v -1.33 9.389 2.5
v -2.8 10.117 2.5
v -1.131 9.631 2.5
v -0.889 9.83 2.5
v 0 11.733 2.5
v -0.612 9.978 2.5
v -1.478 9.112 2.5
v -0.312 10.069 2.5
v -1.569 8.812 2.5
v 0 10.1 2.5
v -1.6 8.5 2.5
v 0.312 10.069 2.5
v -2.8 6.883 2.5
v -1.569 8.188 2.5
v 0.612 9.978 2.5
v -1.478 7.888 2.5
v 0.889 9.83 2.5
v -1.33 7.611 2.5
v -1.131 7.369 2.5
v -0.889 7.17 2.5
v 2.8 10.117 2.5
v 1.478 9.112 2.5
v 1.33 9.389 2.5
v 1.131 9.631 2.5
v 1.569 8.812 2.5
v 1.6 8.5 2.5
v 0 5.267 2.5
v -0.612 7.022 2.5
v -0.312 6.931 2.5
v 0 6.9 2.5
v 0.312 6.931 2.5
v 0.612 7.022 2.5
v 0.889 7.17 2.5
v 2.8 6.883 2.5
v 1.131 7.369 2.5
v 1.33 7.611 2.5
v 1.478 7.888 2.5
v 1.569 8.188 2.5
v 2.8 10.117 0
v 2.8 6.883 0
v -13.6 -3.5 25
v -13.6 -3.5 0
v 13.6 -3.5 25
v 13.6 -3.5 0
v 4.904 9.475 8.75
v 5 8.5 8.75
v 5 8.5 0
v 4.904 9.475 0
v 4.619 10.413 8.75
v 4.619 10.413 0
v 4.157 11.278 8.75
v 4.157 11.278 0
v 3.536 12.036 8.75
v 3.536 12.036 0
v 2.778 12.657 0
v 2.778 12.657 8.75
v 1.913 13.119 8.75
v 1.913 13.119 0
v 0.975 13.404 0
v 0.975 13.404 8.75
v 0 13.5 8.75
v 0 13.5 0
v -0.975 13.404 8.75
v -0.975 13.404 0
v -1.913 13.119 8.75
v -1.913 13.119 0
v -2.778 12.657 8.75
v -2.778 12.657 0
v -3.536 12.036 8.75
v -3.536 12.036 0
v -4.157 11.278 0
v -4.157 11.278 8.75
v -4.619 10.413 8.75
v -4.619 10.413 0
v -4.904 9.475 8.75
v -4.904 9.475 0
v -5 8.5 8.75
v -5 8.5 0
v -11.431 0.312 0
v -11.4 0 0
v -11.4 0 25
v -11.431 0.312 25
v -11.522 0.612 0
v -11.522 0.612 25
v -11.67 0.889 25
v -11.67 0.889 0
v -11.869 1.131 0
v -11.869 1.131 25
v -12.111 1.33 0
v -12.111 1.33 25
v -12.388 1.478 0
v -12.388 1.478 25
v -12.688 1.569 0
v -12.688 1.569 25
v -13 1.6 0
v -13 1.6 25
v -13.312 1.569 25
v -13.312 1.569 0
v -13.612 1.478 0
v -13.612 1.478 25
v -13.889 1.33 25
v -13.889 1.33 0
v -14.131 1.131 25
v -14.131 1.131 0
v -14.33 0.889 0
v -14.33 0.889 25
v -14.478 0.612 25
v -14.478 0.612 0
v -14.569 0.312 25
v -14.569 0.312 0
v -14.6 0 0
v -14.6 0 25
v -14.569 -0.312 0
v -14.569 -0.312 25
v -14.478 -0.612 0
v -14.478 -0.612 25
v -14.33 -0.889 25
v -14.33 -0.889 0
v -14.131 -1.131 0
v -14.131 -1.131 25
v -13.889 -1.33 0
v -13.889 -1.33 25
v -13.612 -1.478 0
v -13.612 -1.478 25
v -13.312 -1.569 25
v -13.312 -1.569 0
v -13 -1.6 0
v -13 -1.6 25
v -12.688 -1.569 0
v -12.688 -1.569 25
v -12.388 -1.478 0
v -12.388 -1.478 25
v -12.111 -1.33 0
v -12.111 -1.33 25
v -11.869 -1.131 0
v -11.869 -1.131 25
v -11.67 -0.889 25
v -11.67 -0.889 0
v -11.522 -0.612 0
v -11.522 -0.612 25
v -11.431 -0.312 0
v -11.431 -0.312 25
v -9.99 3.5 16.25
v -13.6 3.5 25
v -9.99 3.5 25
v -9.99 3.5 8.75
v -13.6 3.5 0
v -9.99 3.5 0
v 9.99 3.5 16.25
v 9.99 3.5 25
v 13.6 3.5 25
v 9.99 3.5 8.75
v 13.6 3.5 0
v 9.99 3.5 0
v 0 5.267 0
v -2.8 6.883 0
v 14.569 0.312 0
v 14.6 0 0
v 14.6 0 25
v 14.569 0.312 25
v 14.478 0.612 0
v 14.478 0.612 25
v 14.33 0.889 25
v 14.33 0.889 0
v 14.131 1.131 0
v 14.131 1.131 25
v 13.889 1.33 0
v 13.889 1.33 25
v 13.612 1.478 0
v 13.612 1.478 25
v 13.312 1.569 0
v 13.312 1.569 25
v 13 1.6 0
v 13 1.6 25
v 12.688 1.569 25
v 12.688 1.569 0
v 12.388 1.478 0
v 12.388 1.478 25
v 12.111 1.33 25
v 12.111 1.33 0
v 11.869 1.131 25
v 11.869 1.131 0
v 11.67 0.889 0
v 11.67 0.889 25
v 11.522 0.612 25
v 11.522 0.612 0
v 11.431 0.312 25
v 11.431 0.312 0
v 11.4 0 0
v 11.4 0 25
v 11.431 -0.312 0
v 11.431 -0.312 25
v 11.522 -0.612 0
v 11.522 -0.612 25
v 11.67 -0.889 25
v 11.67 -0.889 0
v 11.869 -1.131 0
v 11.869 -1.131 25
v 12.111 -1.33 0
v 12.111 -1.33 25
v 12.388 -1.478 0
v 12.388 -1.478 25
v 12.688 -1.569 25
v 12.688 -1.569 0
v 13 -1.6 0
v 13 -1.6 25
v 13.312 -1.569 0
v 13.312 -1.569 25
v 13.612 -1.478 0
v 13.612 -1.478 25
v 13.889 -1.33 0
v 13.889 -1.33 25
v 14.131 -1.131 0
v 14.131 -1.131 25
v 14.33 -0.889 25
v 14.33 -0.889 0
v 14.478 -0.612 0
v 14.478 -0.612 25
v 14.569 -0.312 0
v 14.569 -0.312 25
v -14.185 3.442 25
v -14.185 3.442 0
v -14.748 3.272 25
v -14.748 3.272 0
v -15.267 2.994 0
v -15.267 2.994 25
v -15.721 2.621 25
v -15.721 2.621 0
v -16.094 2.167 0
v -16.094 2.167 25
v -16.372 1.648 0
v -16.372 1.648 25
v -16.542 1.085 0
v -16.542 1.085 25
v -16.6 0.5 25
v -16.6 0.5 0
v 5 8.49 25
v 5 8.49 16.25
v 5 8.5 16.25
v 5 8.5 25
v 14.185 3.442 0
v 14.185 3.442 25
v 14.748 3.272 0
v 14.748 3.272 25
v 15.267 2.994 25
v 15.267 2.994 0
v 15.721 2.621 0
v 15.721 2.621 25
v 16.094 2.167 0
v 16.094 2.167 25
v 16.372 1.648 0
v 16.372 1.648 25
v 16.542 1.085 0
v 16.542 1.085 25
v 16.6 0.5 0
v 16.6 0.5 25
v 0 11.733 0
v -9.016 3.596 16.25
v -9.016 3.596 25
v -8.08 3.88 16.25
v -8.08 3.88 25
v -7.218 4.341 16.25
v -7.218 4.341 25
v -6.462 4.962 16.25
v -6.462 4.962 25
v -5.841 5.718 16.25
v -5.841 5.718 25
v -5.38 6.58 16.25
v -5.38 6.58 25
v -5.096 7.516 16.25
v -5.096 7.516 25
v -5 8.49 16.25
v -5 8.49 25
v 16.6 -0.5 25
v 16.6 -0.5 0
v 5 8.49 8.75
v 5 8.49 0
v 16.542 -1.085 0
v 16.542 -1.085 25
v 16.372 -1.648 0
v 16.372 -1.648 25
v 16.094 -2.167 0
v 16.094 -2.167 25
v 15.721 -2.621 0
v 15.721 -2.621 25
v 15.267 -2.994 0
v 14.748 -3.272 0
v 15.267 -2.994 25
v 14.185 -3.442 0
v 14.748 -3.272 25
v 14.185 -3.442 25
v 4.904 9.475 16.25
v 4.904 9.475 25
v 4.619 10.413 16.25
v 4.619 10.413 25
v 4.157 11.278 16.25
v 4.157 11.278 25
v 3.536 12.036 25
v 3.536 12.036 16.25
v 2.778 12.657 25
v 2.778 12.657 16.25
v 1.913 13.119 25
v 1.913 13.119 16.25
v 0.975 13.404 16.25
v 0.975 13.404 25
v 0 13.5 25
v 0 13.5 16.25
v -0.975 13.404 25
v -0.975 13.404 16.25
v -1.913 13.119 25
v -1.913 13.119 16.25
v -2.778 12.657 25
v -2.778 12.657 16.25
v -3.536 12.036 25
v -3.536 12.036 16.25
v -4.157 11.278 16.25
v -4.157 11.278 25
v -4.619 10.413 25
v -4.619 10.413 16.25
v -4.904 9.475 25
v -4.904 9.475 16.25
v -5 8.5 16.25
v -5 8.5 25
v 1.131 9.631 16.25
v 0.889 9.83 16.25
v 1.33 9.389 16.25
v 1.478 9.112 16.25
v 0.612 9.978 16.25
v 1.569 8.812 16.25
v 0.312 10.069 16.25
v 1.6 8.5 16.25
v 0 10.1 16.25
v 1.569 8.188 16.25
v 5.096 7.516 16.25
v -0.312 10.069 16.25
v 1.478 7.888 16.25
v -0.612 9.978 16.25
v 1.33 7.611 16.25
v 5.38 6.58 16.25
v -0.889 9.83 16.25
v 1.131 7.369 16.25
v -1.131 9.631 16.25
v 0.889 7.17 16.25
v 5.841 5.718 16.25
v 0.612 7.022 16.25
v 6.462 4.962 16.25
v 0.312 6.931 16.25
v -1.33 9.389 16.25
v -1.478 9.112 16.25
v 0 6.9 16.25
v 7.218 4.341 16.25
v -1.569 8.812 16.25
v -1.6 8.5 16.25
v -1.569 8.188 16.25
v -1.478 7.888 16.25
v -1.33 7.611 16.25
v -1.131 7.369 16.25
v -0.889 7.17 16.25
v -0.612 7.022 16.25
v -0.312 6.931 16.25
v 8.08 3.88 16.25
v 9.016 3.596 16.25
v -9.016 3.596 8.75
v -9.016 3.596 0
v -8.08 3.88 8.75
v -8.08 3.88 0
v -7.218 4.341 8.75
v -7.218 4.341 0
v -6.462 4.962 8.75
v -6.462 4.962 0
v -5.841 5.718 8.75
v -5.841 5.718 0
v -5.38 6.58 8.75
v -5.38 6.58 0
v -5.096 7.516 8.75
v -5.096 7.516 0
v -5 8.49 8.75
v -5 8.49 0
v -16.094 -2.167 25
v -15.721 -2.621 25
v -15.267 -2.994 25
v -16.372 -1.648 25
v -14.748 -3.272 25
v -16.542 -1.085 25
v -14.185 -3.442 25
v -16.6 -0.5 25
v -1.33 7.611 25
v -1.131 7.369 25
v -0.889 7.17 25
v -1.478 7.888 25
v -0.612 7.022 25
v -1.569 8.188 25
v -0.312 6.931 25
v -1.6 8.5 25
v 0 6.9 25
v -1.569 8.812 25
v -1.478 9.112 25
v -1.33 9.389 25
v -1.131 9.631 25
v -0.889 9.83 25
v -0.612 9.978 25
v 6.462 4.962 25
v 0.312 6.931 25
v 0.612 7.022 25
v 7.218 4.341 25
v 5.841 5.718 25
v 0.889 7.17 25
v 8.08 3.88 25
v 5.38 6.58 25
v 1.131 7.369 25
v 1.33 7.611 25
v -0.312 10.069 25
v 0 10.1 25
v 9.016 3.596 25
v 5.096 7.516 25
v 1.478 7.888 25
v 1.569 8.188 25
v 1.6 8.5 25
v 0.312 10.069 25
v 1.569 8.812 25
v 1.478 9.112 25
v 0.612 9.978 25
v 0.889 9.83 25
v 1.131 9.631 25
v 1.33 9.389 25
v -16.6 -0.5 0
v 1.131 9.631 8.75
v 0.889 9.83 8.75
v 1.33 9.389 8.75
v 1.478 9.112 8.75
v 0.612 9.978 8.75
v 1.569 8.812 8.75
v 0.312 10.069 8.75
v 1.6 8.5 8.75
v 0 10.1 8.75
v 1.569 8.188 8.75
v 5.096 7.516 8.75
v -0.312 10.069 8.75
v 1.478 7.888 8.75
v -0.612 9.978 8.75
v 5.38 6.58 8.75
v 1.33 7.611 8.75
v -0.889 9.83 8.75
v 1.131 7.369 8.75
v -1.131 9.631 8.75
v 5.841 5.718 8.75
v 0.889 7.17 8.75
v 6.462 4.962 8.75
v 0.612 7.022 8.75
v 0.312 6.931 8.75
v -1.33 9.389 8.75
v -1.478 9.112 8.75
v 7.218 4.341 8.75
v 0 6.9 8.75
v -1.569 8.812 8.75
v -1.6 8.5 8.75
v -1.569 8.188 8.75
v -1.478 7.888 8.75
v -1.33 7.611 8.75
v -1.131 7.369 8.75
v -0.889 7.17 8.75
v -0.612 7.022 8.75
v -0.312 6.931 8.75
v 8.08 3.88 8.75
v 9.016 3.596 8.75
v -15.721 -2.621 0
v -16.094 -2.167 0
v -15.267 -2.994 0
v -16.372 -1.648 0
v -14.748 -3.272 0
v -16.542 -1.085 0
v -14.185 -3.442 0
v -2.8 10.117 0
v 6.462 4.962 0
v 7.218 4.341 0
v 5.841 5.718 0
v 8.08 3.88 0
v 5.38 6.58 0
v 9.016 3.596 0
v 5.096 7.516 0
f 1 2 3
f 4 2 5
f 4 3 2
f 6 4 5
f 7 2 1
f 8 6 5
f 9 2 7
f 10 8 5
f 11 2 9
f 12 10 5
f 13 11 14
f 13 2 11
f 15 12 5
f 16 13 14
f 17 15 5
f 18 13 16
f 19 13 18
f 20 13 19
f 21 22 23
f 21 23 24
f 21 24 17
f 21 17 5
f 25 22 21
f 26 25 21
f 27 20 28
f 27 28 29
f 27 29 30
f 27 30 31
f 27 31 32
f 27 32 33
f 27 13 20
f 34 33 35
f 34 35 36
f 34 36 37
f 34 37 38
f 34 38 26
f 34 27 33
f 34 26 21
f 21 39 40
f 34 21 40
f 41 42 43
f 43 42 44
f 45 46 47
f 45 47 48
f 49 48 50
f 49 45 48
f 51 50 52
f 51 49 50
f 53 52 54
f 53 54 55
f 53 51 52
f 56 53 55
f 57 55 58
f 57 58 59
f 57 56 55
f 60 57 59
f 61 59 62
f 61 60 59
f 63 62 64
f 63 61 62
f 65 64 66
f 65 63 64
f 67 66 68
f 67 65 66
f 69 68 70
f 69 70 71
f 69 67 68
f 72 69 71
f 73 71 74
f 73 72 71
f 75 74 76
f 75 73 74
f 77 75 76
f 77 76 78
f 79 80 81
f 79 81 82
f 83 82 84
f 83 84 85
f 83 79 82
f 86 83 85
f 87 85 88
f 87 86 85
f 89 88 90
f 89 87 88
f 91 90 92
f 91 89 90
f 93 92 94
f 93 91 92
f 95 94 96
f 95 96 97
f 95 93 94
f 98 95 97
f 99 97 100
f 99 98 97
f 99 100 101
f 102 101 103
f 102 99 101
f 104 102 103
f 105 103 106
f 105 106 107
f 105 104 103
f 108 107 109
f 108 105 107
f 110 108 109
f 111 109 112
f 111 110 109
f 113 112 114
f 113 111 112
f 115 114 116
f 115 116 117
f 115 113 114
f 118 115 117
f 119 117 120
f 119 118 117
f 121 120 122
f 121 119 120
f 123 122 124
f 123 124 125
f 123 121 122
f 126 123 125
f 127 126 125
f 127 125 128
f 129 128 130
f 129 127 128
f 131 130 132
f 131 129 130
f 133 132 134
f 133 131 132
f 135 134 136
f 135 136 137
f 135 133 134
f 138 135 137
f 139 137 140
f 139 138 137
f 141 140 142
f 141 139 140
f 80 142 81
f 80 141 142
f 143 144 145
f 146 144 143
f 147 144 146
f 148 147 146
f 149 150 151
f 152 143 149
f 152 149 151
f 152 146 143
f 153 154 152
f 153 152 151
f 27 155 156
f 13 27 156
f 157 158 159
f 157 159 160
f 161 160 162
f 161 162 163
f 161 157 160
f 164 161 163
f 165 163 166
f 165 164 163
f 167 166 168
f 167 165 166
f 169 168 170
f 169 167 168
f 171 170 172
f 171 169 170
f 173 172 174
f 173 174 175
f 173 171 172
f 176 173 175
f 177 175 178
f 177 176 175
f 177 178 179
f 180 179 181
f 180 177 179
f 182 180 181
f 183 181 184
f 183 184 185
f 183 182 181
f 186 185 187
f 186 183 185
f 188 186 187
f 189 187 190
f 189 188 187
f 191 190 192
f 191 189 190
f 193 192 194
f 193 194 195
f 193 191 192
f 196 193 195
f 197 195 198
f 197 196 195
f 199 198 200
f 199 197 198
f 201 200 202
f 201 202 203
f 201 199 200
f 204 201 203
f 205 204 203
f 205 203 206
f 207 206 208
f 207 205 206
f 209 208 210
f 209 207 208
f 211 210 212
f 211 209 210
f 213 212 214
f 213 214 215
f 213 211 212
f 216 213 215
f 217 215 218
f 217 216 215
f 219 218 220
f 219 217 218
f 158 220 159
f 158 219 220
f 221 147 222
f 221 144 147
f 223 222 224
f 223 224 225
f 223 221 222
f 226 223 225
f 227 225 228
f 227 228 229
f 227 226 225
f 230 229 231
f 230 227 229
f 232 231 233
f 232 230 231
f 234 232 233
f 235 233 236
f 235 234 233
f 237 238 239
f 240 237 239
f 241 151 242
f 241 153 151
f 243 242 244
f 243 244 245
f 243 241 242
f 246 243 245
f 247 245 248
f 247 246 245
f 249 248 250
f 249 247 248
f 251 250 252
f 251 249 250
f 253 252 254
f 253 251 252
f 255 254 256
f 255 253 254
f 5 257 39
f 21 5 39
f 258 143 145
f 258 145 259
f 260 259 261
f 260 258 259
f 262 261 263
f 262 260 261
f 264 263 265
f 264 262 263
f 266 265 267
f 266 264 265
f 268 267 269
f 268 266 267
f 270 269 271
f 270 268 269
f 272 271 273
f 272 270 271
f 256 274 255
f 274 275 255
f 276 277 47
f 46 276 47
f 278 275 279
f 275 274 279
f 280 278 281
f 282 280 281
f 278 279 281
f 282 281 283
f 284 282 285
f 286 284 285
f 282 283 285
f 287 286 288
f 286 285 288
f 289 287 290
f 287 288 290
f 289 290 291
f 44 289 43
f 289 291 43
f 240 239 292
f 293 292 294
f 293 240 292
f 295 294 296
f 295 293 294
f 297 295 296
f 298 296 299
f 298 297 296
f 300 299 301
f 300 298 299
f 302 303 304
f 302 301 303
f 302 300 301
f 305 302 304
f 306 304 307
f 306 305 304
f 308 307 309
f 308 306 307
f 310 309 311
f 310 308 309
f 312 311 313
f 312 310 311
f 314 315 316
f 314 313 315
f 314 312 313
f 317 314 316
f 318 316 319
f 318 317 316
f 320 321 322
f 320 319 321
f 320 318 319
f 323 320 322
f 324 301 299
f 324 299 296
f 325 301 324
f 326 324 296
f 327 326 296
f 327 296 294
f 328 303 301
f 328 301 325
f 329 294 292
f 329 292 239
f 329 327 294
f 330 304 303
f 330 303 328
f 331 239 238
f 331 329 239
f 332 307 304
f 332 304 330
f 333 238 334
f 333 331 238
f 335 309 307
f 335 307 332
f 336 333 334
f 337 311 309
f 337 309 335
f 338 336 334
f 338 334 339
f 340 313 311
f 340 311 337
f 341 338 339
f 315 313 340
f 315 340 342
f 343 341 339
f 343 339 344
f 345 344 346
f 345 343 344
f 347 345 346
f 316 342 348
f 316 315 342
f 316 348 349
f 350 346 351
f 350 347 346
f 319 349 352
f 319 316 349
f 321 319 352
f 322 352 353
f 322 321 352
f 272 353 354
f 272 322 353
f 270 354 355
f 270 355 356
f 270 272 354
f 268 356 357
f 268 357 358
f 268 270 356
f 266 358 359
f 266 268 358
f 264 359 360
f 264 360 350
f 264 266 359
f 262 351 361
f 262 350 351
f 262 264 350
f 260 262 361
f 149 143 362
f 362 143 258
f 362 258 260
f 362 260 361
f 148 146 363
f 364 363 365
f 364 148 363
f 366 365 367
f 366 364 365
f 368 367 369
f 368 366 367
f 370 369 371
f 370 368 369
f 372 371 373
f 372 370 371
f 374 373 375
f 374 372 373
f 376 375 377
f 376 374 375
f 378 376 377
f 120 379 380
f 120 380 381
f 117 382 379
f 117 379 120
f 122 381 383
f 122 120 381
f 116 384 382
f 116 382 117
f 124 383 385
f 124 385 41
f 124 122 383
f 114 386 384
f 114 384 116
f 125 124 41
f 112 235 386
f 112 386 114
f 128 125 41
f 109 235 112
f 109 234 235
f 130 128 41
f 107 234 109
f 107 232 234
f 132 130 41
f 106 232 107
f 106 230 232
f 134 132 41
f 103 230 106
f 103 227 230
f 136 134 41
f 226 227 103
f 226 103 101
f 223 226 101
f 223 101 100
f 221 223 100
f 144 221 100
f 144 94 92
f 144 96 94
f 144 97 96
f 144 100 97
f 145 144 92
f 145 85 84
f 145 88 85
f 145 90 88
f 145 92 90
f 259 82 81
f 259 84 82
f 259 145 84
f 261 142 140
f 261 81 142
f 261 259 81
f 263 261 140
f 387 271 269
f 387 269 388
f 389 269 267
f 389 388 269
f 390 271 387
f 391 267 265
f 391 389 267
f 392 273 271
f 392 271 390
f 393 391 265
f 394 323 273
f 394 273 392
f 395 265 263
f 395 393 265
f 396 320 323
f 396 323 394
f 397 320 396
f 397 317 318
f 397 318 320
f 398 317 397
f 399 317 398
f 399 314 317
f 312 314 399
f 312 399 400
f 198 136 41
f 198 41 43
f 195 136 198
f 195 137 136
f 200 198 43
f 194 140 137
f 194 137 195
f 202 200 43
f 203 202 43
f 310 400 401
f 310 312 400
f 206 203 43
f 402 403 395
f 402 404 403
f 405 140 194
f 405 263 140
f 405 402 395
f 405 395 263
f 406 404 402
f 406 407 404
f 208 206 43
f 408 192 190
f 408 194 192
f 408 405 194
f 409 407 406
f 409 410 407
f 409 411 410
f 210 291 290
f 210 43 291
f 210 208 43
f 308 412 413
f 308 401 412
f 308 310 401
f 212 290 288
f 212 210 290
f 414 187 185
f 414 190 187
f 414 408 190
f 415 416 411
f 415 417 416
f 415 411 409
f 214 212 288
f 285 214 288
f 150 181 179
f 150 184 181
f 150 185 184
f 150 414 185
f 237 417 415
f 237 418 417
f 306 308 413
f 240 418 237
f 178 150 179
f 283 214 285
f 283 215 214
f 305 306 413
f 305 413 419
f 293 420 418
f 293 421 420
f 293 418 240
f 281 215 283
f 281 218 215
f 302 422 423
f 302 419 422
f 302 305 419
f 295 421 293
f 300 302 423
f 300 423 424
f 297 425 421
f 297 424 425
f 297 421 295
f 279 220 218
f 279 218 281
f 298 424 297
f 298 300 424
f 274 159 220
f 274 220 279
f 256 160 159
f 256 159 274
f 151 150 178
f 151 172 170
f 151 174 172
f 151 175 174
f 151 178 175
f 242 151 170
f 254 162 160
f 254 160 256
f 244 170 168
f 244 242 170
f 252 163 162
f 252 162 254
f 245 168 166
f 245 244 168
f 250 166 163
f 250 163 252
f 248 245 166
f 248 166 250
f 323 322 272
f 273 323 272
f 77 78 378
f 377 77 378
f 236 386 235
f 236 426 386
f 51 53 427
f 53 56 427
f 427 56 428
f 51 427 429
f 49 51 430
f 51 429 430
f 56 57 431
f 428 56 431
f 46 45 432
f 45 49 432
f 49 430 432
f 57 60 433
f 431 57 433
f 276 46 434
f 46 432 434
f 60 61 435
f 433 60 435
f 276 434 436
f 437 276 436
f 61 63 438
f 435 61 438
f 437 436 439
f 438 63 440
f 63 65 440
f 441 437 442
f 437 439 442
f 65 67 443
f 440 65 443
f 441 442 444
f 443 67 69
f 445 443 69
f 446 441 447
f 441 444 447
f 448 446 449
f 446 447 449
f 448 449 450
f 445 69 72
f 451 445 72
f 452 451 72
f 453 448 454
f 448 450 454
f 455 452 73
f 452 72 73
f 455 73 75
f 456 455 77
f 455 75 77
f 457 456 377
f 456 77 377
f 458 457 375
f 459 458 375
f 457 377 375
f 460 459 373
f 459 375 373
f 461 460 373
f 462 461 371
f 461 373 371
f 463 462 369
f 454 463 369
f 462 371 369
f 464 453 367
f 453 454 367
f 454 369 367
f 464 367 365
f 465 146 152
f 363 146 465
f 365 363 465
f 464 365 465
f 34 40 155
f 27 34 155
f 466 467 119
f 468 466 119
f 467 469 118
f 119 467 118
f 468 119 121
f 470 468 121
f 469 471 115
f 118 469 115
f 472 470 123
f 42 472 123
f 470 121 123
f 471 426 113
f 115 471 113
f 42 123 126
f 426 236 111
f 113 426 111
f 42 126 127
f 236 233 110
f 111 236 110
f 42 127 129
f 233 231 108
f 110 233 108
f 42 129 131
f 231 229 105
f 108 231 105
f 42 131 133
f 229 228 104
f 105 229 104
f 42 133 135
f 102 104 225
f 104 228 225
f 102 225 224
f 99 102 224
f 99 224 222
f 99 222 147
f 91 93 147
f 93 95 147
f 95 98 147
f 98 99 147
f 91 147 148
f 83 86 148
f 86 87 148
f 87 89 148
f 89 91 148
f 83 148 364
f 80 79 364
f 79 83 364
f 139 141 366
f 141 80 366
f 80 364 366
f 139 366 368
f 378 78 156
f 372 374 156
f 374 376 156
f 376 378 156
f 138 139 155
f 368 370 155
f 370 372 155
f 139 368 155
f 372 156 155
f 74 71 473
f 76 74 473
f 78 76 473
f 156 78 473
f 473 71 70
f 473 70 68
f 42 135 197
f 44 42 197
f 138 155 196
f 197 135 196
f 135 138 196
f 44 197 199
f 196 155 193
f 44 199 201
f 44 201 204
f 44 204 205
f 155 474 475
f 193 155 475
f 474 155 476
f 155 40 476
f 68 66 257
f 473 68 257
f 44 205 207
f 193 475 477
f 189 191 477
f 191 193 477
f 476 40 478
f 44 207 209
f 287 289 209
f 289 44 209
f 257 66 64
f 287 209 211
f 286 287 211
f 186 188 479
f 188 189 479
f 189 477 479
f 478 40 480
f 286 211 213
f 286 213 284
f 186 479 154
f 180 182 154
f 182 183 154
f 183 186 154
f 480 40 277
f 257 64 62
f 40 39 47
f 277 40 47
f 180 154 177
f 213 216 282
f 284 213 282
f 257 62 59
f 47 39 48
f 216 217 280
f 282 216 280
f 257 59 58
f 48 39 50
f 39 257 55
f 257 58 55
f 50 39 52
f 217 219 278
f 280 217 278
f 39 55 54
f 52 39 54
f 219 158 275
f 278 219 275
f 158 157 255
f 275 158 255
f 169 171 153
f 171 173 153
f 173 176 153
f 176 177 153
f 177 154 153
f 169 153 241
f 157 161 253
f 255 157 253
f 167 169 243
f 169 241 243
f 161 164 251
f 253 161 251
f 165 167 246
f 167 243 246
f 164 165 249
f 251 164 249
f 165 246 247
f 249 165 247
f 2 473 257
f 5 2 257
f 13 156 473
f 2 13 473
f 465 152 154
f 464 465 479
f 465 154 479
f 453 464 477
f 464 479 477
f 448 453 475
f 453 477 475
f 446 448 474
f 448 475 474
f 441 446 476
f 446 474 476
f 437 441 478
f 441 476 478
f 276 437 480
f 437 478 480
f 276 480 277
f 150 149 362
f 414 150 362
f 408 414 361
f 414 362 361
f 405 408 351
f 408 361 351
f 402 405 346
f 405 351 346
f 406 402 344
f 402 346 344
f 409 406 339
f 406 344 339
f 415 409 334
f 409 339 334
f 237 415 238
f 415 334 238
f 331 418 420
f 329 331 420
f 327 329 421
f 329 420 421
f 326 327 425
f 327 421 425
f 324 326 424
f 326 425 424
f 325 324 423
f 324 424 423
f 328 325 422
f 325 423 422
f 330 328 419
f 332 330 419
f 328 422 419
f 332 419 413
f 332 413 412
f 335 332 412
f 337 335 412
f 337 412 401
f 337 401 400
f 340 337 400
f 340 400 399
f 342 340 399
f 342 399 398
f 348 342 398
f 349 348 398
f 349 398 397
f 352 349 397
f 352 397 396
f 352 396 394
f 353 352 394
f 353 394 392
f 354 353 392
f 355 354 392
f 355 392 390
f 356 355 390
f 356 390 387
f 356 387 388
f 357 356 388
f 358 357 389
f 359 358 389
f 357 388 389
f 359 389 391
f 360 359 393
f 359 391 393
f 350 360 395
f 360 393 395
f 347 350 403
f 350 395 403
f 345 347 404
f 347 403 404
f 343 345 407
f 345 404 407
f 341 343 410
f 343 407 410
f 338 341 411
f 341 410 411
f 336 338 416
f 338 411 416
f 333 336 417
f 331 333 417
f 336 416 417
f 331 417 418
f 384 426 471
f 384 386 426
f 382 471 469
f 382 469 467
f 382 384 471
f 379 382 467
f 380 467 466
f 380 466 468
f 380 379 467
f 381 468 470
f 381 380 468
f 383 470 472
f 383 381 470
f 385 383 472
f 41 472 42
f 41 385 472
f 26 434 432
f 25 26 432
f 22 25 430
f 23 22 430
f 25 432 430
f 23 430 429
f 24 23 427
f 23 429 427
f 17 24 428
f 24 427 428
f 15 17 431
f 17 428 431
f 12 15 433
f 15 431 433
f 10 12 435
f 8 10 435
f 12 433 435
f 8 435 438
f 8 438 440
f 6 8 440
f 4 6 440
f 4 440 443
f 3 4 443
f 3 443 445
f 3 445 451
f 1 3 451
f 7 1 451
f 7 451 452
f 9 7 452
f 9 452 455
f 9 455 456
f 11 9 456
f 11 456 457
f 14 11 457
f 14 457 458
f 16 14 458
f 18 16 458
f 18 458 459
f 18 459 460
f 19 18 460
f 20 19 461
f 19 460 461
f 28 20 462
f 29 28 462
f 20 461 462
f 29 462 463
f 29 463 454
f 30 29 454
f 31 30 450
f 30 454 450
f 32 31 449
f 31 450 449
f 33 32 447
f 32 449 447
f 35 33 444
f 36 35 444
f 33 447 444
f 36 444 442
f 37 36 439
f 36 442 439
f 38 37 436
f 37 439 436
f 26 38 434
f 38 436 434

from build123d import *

# Parameters (mm, degrees)
SKETCH_W        = 33.2
SKETCH_H        = 7
SKETCH_R        = 1.6
PAD_DEPTH       = 25
SKETCH001_R     = 1.6
PAD001_DEPTH    = 25
FILLET_R        = 4.99
SKETCH002_W     = 10
SKETCH002_H     = 7.5
POCKET_DEPTH    = 33.201
POCKET001_DEPTH = 2.5
FILLET001_R     = 3


with BuildPart() as part:
    # Sketch → Pad (new body)
    with BuildSketch(Plane.XY):
        Rectangle(SKETCH_W, SKETCH_H)
        with Locations((-13, 0)):
            Circle(SKETCH_R, mode=Mode.SUBTRACT)
        with Locations((13, 0)):
            Circle(SKETCH_R, mode=Mode.SUBTRACT)
    extrude(amount=PAD_DEPTH)

    # Sketch001 (on Face8 of Pad) → Pad001 (join)
    with BuildSketch(Plane.XY.offset(25)):
        with BuildLine():
            ThreePointArc((5, 8.5), (0, 13.5), (-5, 8.5))
            Line((-5, 8.5), (-5, 3.5))
            Line((-5, 3.5), (5, 3.5))
            Line((5, 3.5), (5, 8.5))
        make_face()
        with Locations((0, 8.5)):
            Circle(SKETCH001_R, mode=Mode.SUBTRACT)
    extrude(amount=-PAD001_DEPTH)

    # Fillet
    fillet_edges = [part.edges().sort_by_distance(p)[0] for p in [
        (-5, 3.5, 12.5),
        (5, 3.5, 12.5),
    ]]
    fillet(fillet_edges, radius=FILLET_R)

    # Sketch002 (on Face4 of Fillet) → Pocket (cut, through all)
    with BuildSketch(Plane(origin=(-16.6, 0, 0), x_dir=(0, -1, 0), z_dir=(-1, 0, 0))):
        with Locations((-8.5, 12.5)):
            Rectangle(SKETCH002_W, SKETCH002_H)
    extrude(amount=-POCKET_DEPTH, mode=Mode.SUBTRACT)

    # Sketch004 (on Face6 of Pocket) → Pocket001 (cut)
    with BuildSketch(Plane(origin=(0, 0, 0), x_dir=(1, 0, 0), z_dir=(0, 0, -1))):
        Polygon((2.8, -6.883419), (0, -5.266838), (-2.8, -6.883419), (-2.8, -10.116581), (0, -11.733162), (2.8, -10.116581), align=None)
    extrude(amount=-POCKET001_DEPTH, mode=Mode.SUBTRACT)

    # Fillet001
    fillet001_edges = [part.edges().sort_by_distance(p)[0] for p in [
        (16.6, 3.5, 4.375),
        (16.6, -3.5, 12.5),
        (-16.6, 3.5, 20.625),
        (-16.6, -3.5, 12.5),
    ]]
    fillet(fillet001_edges, radius=FILLET001_R)


solid = part.part
